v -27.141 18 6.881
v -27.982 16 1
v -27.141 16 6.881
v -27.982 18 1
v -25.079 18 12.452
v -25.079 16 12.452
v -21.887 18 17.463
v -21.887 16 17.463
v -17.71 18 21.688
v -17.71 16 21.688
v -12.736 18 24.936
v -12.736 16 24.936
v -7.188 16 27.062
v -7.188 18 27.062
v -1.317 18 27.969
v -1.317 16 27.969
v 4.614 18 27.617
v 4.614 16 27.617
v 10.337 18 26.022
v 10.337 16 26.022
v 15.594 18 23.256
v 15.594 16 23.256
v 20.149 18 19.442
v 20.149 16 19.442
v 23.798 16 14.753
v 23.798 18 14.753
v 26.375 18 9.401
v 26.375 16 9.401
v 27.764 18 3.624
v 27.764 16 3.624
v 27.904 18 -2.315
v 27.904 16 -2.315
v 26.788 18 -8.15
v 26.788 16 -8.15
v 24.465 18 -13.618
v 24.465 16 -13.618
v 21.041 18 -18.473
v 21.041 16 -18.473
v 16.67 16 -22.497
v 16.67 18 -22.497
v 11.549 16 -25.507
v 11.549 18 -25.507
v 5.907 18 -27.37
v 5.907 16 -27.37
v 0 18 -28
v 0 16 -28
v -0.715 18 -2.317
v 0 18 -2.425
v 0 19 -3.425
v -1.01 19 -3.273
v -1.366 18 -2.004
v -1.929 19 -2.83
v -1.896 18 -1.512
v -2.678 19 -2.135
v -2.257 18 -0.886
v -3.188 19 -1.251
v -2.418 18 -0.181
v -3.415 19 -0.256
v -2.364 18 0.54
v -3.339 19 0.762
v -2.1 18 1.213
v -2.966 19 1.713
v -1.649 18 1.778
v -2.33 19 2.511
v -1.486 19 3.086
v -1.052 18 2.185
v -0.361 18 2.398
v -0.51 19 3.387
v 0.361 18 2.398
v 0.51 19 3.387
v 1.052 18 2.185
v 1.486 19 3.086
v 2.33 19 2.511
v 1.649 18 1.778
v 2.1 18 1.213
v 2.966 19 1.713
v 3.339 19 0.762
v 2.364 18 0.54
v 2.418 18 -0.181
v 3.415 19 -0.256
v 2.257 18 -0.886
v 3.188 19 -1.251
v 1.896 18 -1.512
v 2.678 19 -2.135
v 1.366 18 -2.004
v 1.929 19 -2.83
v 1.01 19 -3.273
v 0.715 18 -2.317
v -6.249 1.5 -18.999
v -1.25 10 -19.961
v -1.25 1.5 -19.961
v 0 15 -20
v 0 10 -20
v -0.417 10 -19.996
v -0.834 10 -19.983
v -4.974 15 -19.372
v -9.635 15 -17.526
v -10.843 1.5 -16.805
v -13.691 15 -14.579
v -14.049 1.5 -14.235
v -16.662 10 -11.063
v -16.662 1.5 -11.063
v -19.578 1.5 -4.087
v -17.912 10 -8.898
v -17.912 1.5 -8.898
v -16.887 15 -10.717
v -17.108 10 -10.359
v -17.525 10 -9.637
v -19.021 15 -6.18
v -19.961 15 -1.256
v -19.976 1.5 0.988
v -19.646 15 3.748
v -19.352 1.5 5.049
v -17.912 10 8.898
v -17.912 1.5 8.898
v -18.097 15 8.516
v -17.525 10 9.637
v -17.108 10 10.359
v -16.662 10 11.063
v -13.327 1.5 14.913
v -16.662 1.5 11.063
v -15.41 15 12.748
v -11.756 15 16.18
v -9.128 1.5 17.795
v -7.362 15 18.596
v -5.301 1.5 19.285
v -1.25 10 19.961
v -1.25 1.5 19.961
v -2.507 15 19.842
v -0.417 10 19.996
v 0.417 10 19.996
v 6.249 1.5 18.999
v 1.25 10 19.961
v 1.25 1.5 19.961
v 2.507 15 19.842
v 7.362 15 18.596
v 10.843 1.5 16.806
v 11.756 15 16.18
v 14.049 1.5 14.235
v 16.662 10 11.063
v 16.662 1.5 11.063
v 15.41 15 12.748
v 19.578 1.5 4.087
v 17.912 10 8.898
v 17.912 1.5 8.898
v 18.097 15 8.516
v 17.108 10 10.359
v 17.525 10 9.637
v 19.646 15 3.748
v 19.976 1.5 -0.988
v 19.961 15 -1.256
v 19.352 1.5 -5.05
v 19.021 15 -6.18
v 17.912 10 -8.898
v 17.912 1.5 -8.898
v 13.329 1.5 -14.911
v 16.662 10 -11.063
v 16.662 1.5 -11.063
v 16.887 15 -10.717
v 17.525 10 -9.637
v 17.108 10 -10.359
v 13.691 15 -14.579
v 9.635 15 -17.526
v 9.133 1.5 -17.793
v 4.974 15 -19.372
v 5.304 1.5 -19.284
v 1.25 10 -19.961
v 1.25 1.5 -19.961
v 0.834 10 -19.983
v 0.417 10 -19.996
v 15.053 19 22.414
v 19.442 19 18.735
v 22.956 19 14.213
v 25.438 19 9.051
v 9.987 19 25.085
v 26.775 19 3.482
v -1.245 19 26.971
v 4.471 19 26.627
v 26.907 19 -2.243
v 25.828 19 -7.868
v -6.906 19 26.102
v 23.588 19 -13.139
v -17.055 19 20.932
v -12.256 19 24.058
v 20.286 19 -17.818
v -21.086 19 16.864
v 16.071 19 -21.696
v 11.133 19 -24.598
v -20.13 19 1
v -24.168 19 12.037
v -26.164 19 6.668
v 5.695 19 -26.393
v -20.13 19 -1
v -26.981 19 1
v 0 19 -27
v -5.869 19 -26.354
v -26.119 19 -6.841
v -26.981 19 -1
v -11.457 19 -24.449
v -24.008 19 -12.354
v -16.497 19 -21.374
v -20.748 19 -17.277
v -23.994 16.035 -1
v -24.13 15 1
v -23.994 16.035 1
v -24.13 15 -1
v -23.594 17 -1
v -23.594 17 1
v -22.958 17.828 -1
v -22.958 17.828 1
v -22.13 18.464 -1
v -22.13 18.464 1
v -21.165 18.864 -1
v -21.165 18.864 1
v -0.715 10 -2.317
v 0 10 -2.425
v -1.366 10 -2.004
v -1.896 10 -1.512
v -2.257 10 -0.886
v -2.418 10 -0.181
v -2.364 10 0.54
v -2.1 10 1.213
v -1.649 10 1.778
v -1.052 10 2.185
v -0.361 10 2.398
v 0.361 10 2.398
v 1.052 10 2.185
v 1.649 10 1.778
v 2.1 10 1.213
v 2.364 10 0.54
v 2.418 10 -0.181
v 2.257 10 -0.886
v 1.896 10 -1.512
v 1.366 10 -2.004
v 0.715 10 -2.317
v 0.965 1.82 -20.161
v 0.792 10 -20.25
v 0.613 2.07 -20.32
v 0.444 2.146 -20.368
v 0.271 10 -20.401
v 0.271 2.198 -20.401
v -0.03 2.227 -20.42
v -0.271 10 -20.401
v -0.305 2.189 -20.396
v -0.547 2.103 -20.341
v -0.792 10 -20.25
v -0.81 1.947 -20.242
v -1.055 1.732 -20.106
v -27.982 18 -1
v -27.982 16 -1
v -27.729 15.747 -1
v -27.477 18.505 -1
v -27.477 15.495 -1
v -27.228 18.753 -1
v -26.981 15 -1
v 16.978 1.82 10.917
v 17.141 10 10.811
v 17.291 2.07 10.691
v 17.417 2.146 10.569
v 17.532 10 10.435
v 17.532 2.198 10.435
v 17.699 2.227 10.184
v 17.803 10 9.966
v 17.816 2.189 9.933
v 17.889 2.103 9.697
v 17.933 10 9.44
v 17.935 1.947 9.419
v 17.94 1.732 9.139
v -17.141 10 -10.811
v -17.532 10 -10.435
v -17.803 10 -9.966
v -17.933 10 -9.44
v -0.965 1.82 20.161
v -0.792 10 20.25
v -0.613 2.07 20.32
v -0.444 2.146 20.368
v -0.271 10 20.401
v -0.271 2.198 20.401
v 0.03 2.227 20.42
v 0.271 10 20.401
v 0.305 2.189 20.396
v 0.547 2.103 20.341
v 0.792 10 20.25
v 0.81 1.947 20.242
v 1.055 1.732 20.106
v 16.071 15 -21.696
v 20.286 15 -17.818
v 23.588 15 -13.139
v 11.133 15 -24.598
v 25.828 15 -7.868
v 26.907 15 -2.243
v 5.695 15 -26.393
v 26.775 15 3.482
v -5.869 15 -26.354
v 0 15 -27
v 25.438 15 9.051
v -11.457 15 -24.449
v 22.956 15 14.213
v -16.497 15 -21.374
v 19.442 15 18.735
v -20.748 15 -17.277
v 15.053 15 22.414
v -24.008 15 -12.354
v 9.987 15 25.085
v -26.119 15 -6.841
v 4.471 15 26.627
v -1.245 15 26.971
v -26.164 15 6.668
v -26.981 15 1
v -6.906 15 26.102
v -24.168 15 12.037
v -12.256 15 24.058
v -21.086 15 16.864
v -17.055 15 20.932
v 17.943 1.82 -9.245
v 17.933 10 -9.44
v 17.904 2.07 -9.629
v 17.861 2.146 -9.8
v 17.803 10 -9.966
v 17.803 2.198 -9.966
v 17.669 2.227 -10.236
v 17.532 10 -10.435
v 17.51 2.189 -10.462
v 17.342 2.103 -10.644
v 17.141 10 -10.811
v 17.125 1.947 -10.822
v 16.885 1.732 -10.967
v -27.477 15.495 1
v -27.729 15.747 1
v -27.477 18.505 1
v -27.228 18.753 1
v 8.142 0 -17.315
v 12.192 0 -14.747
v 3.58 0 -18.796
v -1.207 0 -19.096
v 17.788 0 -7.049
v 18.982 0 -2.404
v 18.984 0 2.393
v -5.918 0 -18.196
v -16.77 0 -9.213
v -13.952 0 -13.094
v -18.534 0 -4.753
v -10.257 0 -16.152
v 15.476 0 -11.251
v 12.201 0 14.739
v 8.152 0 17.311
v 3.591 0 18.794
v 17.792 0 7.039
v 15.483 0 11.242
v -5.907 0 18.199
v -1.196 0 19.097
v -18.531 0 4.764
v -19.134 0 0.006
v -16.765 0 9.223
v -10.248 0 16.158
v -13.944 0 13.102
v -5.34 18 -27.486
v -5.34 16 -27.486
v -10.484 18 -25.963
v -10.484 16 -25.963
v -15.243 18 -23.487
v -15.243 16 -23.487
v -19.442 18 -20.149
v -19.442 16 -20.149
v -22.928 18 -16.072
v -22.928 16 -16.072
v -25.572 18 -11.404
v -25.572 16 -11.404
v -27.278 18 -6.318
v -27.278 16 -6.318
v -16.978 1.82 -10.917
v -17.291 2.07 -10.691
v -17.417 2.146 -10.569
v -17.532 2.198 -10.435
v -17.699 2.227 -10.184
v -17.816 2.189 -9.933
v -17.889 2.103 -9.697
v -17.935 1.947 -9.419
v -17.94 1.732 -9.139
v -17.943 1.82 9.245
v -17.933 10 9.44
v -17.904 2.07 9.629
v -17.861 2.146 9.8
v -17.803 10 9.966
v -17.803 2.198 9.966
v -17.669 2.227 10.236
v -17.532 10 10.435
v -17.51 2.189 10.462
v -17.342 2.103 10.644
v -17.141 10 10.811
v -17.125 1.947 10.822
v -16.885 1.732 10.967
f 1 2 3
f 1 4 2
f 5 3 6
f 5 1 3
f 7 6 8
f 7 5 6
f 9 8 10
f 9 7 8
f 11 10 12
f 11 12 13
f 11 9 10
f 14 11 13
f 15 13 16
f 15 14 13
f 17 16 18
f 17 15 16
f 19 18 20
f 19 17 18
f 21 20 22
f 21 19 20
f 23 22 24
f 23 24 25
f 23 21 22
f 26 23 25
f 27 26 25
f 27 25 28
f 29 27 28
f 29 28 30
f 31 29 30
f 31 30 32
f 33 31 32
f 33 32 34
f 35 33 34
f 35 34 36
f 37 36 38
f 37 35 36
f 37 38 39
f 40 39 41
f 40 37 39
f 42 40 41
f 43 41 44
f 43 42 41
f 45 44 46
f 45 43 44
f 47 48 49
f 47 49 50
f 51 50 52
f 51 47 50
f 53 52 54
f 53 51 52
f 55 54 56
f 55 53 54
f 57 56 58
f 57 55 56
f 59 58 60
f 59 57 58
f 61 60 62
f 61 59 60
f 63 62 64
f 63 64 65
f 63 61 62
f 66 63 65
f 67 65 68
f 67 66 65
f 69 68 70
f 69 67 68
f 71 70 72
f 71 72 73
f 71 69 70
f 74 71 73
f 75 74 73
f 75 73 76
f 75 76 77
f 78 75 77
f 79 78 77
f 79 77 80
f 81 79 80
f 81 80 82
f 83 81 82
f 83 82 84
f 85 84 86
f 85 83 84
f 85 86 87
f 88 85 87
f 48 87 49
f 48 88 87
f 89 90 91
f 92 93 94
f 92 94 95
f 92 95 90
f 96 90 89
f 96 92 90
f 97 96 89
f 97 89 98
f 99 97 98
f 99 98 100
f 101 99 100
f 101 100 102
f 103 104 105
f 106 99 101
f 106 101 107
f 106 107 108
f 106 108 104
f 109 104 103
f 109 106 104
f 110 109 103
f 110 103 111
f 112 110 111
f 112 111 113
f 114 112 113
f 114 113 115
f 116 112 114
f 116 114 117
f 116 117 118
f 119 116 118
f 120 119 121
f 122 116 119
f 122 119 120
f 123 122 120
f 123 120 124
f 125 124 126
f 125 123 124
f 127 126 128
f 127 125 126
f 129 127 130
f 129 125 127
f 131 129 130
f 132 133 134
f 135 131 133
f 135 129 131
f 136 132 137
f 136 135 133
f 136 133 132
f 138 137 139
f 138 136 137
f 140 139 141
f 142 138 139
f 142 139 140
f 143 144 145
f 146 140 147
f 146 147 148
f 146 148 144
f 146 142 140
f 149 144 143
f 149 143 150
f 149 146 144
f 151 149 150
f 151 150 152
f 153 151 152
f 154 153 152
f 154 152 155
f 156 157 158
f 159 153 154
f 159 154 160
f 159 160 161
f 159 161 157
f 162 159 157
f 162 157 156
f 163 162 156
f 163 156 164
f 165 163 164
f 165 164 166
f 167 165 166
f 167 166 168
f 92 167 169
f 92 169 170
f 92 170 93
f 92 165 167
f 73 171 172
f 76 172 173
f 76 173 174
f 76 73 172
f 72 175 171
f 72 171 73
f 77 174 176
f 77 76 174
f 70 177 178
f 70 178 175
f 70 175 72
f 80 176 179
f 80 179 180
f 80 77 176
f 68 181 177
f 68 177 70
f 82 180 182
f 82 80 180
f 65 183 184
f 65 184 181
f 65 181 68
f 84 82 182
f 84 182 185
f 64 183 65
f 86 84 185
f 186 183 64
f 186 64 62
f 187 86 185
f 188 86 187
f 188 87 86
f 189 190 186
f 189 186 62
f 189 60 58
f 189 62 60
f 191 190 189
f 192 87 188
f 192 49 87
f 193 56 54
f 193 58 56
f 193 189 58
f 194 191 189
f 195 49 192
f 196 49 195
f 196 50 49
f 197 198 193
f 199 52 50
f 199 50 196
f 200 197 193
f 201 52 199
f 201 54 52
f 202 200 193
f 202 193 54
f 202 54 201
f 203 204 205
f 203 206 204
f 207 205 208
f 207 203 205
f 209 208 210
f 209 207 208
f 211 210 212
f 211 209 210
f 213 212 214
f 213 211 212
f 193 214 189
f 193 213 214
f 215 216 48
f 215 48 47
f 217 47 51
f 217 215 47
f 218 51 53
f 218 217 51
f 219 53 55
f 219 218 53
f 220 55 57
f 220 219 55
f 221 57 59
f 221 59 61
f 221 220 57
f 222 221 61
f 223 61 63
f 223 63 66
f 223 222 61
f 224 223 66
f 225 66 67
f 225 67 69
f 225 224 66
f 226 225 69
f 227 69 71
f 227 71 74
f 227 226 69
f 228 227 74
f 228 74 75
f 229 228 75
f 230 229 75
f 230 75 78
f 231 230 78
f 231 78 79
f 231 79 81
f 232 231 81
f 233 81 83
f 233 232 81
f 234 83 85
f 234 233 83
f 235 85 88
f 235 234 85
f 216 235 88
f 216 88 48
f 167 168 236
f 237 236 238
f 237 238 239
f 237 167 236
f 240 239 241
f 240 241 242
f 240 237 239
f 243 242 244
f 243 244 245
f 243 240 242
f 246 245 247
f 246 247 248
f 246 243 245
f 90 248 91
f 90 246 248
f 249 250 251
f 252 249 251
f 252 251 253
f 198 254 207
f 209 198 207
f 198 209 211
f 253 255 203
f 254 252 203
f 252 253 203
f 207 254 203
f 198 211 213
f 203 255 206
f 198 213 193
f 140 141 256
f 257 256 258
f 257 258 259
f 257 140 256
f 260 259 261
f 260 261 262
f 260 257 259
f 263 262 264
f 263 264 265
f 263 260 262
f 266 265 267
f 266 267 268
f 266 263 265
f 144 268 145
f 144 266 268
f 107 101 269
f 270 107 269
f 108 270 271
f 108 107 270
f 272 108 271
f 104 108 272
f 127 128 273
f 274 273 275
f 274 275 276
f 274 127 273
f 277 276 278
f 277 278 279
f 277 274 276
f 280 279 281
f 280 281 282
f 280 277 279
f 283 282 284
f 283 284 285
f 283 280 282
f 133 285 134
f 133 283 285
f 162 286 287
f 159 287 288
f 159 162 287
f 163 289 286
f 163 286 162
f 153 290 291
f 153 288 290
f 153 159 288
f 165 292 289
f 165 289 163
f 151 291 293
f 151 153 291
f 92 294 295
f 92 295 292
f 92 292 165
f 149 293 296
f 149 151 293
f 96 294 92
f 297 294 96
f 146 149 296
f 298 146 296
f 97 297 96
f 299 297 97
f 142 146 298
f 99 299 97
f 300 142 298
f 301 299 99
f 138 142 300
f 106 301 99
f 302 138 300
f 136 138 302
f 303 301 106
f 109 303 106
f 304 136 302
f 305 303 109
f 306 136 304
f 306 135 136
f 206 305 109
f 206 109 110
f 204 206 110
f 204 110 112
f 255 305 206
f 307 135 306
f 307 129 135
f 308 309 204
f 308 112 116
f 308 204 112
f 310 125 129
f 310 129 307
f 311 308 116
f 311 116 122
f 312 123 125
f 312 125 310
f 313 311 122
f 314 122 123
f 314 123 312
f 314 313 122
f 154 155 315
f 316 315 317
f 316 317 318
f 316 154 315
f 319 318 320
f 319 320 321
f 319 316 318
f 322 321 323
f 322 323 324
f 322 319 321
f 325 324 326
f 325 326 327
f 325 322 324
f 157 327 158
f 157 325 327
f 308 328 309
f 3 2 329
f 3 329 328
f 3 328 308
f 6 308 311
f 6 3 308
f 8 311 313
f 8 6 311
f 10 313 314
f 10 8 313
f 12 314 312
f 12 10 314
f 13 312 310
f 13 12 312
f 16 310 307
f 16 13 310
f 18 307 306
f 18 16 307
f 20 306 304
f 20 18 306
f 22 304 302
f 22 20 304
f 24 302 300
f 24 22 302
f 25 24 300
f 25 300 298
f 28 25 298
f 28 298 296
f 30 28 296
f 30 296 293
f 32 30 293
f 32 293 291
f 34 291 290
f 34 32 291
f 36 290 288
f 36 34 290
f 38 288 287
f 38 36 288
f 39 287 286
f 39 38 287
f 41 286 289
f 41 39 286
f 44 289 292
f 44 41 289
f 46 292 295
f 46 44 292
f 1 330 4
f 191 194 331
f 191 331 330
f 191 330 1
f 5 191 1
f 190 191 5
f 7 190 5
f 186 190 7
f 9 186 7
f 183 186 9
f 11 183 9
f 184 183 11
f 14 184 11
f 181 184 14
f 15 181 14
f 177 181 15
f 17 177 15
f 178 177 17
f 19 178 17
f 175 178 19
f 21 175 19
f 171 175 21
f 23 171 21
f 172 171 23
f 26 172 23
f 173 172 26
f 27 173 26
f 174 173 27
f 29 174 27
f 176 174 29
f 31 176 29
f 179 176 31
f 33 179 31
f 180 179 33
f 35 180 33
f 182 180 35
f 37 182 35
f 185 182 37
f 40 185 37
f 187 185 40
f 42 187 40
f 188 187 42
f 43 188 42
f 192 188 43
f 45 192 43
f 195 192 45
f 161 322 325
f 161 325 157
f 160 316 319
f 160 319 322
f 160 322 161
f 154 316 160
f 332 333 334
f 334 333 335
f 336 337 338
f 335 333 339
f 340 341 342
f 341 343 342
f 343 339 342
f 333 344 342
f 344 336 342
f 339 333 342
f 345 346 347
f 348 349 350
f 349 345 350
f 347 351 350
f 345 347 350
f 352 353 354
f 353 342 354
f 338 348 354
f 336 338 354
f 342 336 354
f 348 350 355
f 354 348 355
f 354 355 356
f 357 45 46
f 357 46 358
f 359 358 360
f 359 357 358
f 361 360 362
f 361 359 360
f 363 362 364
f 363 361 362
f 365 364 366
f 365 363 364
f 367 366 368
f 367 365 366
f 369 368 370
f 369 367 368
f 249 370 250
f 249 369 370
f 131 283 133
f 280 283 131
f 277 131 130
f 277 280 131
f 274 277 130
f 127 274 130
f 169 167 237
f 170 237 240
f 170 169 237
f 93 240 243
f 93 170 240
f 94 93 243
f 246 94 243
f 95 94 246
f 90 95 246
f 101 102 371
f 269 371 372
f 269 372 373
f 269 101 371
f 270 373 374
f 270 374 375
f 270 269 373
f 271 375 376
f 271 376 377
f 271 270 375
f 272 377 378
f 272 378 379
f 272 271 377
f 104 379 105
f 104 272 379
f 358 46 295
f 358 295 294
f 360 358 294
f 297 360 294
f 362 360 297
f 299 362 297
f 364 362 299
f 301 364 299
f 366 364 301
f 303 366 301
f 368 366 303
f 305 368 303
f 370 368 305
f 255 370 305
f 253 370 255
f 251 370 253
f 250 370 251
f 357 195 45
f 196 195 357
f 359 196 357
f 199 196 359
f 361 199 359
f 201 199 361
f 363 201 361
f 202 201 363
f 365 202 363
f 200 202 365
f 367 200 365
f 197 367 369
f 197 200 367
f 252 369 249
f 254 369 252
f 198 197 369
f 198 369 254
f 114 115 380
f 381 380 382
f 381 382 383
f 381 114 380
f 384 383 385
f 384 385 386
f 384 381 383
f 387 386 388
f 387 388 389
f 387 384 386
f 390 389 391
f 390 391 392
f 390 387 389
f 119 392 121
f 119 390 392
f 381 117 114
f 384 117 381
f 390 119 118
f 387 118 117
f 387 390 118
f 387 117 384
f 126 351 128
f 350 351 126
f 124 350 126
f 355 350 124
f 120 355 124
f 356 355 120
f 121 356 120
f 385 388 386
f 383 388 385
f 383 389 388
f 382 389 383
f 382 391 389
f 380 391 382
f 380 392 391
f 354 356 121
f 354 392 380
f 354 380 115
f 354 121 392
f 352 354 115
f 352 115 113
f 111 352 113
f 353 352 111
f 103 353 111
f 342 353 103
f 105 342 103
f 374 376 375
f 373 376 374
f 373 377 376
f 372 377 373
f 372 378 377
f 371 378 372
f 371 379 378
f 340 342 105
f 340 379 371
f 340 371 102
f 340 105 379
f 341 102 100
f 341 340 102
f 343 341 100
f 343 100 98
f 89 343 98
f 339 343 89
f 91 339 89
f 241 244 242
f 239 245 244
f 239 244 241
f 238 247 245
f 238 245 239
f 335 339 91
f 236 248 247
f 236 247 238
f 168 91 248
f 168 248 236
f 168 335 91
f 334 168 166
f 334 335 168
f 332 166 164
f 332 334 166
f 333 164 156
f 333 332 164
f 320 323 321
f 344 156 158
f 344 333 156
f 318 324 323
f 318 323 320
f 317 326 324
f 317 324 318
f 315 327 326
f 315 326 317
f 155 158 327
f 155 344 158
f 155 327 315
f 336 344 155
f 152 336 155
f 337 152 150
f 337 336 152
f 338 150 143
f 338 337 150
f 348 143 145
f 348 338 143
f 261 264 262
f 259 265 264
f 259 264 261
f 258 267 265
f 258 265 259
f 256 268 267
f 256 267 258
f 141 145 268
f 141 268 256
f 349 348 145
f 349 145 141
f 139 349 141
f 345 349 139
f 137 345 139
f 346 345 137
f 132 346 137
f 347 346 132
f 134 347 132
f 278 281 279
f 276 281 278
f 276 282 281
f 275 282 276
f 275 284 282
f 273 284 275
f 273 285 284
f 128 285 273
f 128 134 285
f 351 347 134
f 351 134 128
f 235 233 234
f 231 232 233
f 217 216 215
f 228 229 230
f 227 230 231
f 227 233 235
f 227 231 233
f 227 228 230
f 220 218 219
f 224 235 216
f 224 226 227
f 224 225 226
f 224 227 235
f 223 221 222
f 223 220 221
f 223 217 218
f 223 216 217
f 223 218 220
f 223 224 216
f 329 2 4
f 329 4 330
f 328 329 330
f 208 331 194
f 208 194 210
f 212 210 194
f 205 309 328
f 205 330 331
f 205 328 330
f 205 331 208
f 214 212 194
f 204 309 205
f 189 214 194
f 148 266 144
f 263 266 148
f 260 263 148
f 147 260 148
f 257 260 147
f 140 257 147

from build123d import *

# Parameters (mm, degrees)
BOSS_EXTRUDE1_START = -10
BOSS_EXTRUDE1_DEPTH = 10
CHAMFER1_SIZE       = 1
SKETCH4_W           = 3.87
SKETCH4_H           = 2
CUT_EXTRUDE1_DEPTH  = 44.920382512
FILLET1_R           = 4


with BuildPart() as part:
    # Sketch1 → Revolve1 (revolve)
    with BuildSketch(Plane.XY, mode=Mode.PRIVATE) as revolve1_sk:
        Polygon((0, 0), (20, 0), (20, 15), (28, 15), (28, 19), (2.425, 19), (2.425, 9), (0, 9), align=None)
    revolve(revolve1_sk.sketch.rotate(Axis((0, 0, 0), (0, 1, 0)), 90), axis=Axis((0, 0, 0), (0, 1, 0)))

    # Sketch2 → Boss-Extrude1 (add)
    with BuildSketch(Plane.XZ.offset(BOSS_EXTRUDE1_START)):
        with BuildLine():
            ThreePointArc((-1.25, 19.960899278), (0, 20.42), (1.25, 19.960899278))
            ThreePointArc((1.25, 19.960899278), (10, 17.320508076), (16.661645857, 11.062981394))
            ThreePointArc((16.661645857, 11.062981394), (17.684238745, 10.21), (17.911645857, 8.897917884))
            ThreePointArc((17.911645857, 8.897917884), (20, 0), (17.911645857, -8.897917884))
            ThreePointArc((17.911645857, -8.897917884), (17.684238745, -10.21), (16.661645857, -11.062981394))
            ThreePointArc((16.661645857, -11.062981394), (10, -17.320508076), (1.25, -19.960899278))
            ThreePointArc((1.25, -19.960899278), (0, -20.42), (-1.25, -19.960899278))
            ThreePointArc((-1.25, -19.960899278), (-10, -17.320508076), (-16.661645857, -11.062981394))
            ThreePointArc((-16.661645857, -11.062981394), (-17.684238745, -10.21), (-17.911645857, -8.897917884))
            ThreePointArc((-17.911645857, -8.897917884), (-20, 0), (-17.911645857, 8.897917884))
            ThreePointArc((-17.911645857, 8.897917884), (-17.684238745, 10.21), (-16.661645857, 11.062981394))
            ThreePointArc((-16.661645857, 11.062981394), (-10, 17.320508076), (-1.25, 19.960899278))
        make_face()
    extrude(amount=BOSS_EXTRUDE1_DEPTH)

    # Sketch3 → Cut-Revolve1 (revolve, cut)
    with BuildSketch(Plane.XY, mode=Mode.PRIVATE) as cut_revolve1_sk:
        Polygon((-21, 3.232050808), (-18.556624327, -1), (-21, -1), align=None)
    revolve(cut_revolve1_sk.sketch.rotate(Axis((0, 29.336873575, 0), (0, -1, 0)), 273.58332148), axis=Axis((0, 29.336873575, 0), (0, -1, 0)), mode=Mode.SUBTRACT)

    # Chamfer1
    chamfer1_edges = [part.edges().sort_by_distance(p)[0] for p in [
        (0, 19, 2.425),
        (0, 19, 28),
        (0, 15, 28),
    ]]
    chamfer(chamfer1_edges, length=CHAMFER1_SIZE)

    # Sketch4 → Cut-Extrude1 (cut, through all)
    with BuildSketch(Plane.XZ):
        with Locations((-26.065, 0)):
            Rectangle(SKETCH4_W, SKETCH4_H)
    extrude(amount=-CUT_EXTRUDE1_DEPTH, mode=Mode.SUBTRACT)

    # Fillet1
    fillet1_edges = [part.edges().sort_by_distance(p)[0] for p in [
        (-24.13, 19, 0),
    ]]
    fillet(fillet1_edges, radius=FILLET1_R - 0.0001)  # a hair under: the kernel refuses the full size


solid = part.part
